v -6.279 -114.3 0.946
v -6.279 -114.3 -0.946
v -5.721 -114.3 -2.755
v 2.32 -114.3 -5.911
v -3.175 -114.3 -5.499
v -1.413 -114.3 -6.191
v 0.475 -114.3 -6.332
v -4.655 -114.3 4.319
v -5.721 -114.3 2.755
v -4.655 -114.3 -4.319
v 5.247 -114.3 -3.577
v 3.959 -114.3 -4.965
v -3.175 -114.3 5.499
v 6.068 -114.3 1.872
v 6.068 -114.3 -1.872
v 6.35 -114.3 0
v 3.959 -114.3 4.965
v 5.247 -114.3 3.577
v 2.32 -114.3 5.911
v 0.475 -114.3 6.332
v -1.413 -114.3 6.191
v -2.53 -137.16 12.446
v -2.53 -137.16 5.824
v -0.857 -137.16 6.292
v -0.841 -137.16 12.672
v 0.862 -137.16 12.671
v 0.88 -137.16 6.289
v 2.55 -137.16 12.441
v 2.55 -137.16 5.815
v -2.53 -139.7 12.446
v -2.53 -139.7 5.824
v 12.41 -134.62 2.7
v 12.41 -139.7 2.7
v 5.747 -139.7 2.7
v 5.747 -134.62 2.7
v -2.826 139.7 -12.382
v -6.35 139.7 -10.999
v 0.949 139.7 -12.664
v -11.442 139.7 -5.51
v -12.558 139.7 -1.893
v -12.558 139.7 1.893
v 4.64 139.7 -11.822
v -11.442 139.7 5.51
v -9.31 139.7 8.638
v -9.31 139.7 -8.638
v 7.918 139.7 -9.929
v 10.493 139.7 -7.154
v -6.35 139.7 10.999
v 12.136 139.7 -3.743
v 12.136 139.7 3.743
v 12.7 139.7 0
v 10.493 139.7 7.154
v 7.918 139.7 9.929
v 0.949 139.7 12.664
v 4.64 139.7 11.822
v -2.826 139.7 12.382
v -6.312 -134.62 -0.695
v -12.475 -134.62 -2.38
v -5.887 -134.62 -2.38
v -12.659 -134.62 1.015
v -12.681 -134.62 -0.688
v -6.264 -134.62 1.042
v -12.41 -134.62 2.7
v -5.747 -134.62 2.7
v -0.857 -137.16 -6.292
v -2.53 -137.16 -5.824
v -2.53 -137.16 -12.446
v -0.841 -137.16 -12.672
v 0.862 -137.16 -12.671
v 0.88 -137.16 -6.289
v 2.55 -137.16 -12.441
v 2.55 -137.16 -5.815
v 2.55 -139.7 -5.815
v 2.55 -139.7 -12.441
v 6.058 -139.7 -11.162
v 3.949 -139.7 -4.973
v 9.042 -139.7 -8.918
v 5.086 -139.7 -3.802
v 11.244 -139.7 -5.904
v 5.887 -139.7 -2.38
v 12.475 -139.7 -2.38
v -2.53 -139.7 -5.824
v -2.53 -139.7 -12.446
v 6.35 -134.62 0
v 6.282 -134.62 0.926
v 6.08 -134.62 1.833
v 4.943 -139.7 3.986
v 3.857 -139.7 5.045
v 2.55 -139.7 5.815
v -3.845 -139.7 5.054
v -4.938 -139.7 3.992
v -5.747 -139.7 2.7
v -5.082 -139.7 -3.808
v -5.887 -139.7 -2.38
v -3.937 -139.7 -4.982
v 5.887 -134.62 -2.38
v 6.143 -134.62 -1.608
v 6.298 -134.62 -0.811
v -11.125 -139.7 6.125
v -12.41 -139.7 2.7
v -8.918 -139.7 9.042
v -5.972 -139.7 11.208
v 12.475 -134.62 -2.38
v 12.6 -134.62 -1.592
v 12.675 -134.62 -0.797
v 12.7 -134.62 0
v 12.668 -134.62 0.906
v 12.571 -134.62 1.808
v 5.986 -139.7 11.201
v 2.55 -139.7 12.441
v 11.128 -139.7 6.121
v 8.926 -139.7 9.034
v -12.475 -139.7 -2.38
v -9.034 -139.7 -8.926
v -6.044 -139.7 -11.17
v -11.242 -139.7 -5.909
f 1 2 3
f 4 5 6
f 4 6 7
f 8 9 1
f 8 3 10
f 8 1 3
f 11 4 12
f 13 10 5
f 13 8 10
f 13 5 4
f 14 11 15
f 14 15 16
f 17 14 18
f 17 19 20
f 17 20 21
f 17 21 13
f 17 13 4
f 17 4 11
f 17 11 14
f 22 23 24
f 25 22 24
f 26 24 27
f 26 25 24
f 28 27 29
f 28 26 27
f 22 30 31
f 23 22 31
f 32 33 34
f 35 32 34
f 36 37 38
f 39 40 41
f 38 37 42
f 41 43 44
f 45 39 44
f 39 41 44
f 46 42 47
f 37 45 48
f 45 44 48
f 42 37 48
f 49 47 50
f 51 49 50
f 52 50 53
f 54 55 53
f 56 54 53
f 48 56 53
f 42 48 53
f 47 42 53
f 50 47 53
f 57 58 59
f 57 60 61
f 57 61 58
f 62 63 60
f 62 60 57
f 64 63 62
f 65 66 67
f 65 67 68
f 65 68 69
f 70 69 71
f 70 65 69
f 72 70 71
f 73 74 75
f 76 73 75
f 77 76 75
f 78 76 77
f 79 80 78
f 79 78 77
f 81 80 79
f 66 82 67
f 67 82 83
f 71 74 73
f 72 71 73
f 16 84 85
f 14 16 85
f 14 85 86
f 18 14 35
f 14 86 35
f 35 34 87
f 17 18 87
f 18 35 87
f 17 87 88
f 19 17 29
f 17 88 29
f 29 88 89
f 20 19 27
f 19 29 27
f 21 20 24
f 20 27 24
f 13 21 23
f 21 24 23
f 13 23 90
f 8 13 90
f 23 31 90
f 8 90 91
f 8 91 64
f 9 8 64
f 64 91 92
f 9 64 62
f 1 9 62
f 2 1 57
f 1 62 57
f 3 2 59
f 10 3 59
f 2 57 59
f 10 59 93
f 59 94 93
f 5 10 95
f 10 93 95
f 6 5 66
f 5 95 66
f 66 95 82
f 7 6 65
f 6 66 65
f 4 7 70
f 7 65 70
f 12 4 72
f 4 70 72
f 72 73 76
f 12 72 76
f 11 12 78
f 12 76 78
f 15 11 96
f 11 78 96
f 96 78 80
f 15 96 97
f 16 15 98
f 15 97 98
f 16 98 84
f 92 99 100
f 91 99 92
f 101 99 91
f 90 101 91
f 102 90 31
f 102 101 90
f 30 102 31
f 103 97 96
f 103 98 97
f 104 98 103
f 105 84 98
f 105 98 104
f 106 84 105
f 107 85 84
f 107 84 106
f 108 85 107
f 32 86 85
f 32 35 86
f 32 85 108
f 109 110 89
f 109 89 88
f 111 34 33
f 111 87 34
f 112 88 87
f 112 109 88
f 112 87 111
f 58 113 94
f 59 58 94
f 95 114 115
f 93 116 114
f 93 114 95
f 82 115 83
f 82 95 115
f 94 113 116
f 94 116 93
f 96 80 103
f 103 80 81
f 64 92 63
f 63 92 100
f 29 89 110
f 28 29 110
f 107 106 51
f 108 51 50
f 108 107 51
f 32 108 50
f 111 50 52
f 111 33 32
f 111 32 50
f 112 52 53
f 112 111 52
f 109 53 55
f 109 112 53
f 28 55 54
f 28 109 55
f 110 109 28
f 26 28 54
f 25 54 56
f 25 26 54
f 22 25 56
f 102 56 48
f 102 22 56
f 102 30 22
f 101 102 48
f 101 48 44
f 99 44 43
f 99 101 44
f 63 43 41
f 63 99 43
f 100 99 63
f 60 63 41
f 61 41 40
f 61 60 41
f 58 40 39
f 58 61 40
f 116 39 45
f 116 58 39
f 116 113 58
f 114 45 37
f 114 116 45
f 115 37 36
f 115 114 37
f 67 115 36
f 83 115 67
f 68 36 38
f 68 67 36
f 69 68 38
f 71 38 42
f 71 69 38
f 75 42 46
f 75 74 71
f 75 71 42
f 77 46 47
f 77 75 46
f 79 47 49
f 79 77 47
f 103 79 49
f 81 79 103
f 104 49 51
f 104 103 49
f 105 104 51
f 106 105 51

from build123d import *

# Parameters (mm, degrees)
F0_R     = 12.7
F1_DEPTH = 139.7
F2_R     = 6.35
F3_DEPTH = 25.4
F5_DEPTH = 2.54
F7_DEPTH = 5.08


with BuildPart() as f1:
    # F0 (on Front) → F1 (new body, symmetric)
    with BuildSketch(Plane.XZ):
        Circle(F0_R)
    extrude(amount=F1_DEPTH, both=True)

    # F2 (on face) → F3 (cut)
    with BuildSketch(Plane.XZ.offset(139.7)):
        Circle(F2_R)
    extrude(amount=-F3_DEPTH, mode=Mode.SUBTRACT)

    # F4 (on face) → F5 (cut)
    with BuildSketch(Plane.XZ.offset(139.7)):
        Polygon((-2.529651, 18.032704), (-2.529651, 12.445516), (-2.529651, -12.445516), (-2.529651, -16.867724), (2.550349, -16.867724), (2.550349, -12.441291), (2.550349, 12.445516), (2.550349, 18.032704), align=None)
    extrude(amount=-F5_DEPTH, mode=Mode.SUBTRACT)

    # F6 (on face) → F7 (cut)
    with BuildSketch(Plane.XZ.offset(139.7)):
        Polygon((25.367279, -2.379521), (25.367279, 0), (25.367279, 2.700479), (-15.440687, 2.700479), (-15.440687, -2.379521), align=None)
    extrude(amount=-F7_DEPTH, mode=Mode.SUBTRACT)


solid = f1.part
